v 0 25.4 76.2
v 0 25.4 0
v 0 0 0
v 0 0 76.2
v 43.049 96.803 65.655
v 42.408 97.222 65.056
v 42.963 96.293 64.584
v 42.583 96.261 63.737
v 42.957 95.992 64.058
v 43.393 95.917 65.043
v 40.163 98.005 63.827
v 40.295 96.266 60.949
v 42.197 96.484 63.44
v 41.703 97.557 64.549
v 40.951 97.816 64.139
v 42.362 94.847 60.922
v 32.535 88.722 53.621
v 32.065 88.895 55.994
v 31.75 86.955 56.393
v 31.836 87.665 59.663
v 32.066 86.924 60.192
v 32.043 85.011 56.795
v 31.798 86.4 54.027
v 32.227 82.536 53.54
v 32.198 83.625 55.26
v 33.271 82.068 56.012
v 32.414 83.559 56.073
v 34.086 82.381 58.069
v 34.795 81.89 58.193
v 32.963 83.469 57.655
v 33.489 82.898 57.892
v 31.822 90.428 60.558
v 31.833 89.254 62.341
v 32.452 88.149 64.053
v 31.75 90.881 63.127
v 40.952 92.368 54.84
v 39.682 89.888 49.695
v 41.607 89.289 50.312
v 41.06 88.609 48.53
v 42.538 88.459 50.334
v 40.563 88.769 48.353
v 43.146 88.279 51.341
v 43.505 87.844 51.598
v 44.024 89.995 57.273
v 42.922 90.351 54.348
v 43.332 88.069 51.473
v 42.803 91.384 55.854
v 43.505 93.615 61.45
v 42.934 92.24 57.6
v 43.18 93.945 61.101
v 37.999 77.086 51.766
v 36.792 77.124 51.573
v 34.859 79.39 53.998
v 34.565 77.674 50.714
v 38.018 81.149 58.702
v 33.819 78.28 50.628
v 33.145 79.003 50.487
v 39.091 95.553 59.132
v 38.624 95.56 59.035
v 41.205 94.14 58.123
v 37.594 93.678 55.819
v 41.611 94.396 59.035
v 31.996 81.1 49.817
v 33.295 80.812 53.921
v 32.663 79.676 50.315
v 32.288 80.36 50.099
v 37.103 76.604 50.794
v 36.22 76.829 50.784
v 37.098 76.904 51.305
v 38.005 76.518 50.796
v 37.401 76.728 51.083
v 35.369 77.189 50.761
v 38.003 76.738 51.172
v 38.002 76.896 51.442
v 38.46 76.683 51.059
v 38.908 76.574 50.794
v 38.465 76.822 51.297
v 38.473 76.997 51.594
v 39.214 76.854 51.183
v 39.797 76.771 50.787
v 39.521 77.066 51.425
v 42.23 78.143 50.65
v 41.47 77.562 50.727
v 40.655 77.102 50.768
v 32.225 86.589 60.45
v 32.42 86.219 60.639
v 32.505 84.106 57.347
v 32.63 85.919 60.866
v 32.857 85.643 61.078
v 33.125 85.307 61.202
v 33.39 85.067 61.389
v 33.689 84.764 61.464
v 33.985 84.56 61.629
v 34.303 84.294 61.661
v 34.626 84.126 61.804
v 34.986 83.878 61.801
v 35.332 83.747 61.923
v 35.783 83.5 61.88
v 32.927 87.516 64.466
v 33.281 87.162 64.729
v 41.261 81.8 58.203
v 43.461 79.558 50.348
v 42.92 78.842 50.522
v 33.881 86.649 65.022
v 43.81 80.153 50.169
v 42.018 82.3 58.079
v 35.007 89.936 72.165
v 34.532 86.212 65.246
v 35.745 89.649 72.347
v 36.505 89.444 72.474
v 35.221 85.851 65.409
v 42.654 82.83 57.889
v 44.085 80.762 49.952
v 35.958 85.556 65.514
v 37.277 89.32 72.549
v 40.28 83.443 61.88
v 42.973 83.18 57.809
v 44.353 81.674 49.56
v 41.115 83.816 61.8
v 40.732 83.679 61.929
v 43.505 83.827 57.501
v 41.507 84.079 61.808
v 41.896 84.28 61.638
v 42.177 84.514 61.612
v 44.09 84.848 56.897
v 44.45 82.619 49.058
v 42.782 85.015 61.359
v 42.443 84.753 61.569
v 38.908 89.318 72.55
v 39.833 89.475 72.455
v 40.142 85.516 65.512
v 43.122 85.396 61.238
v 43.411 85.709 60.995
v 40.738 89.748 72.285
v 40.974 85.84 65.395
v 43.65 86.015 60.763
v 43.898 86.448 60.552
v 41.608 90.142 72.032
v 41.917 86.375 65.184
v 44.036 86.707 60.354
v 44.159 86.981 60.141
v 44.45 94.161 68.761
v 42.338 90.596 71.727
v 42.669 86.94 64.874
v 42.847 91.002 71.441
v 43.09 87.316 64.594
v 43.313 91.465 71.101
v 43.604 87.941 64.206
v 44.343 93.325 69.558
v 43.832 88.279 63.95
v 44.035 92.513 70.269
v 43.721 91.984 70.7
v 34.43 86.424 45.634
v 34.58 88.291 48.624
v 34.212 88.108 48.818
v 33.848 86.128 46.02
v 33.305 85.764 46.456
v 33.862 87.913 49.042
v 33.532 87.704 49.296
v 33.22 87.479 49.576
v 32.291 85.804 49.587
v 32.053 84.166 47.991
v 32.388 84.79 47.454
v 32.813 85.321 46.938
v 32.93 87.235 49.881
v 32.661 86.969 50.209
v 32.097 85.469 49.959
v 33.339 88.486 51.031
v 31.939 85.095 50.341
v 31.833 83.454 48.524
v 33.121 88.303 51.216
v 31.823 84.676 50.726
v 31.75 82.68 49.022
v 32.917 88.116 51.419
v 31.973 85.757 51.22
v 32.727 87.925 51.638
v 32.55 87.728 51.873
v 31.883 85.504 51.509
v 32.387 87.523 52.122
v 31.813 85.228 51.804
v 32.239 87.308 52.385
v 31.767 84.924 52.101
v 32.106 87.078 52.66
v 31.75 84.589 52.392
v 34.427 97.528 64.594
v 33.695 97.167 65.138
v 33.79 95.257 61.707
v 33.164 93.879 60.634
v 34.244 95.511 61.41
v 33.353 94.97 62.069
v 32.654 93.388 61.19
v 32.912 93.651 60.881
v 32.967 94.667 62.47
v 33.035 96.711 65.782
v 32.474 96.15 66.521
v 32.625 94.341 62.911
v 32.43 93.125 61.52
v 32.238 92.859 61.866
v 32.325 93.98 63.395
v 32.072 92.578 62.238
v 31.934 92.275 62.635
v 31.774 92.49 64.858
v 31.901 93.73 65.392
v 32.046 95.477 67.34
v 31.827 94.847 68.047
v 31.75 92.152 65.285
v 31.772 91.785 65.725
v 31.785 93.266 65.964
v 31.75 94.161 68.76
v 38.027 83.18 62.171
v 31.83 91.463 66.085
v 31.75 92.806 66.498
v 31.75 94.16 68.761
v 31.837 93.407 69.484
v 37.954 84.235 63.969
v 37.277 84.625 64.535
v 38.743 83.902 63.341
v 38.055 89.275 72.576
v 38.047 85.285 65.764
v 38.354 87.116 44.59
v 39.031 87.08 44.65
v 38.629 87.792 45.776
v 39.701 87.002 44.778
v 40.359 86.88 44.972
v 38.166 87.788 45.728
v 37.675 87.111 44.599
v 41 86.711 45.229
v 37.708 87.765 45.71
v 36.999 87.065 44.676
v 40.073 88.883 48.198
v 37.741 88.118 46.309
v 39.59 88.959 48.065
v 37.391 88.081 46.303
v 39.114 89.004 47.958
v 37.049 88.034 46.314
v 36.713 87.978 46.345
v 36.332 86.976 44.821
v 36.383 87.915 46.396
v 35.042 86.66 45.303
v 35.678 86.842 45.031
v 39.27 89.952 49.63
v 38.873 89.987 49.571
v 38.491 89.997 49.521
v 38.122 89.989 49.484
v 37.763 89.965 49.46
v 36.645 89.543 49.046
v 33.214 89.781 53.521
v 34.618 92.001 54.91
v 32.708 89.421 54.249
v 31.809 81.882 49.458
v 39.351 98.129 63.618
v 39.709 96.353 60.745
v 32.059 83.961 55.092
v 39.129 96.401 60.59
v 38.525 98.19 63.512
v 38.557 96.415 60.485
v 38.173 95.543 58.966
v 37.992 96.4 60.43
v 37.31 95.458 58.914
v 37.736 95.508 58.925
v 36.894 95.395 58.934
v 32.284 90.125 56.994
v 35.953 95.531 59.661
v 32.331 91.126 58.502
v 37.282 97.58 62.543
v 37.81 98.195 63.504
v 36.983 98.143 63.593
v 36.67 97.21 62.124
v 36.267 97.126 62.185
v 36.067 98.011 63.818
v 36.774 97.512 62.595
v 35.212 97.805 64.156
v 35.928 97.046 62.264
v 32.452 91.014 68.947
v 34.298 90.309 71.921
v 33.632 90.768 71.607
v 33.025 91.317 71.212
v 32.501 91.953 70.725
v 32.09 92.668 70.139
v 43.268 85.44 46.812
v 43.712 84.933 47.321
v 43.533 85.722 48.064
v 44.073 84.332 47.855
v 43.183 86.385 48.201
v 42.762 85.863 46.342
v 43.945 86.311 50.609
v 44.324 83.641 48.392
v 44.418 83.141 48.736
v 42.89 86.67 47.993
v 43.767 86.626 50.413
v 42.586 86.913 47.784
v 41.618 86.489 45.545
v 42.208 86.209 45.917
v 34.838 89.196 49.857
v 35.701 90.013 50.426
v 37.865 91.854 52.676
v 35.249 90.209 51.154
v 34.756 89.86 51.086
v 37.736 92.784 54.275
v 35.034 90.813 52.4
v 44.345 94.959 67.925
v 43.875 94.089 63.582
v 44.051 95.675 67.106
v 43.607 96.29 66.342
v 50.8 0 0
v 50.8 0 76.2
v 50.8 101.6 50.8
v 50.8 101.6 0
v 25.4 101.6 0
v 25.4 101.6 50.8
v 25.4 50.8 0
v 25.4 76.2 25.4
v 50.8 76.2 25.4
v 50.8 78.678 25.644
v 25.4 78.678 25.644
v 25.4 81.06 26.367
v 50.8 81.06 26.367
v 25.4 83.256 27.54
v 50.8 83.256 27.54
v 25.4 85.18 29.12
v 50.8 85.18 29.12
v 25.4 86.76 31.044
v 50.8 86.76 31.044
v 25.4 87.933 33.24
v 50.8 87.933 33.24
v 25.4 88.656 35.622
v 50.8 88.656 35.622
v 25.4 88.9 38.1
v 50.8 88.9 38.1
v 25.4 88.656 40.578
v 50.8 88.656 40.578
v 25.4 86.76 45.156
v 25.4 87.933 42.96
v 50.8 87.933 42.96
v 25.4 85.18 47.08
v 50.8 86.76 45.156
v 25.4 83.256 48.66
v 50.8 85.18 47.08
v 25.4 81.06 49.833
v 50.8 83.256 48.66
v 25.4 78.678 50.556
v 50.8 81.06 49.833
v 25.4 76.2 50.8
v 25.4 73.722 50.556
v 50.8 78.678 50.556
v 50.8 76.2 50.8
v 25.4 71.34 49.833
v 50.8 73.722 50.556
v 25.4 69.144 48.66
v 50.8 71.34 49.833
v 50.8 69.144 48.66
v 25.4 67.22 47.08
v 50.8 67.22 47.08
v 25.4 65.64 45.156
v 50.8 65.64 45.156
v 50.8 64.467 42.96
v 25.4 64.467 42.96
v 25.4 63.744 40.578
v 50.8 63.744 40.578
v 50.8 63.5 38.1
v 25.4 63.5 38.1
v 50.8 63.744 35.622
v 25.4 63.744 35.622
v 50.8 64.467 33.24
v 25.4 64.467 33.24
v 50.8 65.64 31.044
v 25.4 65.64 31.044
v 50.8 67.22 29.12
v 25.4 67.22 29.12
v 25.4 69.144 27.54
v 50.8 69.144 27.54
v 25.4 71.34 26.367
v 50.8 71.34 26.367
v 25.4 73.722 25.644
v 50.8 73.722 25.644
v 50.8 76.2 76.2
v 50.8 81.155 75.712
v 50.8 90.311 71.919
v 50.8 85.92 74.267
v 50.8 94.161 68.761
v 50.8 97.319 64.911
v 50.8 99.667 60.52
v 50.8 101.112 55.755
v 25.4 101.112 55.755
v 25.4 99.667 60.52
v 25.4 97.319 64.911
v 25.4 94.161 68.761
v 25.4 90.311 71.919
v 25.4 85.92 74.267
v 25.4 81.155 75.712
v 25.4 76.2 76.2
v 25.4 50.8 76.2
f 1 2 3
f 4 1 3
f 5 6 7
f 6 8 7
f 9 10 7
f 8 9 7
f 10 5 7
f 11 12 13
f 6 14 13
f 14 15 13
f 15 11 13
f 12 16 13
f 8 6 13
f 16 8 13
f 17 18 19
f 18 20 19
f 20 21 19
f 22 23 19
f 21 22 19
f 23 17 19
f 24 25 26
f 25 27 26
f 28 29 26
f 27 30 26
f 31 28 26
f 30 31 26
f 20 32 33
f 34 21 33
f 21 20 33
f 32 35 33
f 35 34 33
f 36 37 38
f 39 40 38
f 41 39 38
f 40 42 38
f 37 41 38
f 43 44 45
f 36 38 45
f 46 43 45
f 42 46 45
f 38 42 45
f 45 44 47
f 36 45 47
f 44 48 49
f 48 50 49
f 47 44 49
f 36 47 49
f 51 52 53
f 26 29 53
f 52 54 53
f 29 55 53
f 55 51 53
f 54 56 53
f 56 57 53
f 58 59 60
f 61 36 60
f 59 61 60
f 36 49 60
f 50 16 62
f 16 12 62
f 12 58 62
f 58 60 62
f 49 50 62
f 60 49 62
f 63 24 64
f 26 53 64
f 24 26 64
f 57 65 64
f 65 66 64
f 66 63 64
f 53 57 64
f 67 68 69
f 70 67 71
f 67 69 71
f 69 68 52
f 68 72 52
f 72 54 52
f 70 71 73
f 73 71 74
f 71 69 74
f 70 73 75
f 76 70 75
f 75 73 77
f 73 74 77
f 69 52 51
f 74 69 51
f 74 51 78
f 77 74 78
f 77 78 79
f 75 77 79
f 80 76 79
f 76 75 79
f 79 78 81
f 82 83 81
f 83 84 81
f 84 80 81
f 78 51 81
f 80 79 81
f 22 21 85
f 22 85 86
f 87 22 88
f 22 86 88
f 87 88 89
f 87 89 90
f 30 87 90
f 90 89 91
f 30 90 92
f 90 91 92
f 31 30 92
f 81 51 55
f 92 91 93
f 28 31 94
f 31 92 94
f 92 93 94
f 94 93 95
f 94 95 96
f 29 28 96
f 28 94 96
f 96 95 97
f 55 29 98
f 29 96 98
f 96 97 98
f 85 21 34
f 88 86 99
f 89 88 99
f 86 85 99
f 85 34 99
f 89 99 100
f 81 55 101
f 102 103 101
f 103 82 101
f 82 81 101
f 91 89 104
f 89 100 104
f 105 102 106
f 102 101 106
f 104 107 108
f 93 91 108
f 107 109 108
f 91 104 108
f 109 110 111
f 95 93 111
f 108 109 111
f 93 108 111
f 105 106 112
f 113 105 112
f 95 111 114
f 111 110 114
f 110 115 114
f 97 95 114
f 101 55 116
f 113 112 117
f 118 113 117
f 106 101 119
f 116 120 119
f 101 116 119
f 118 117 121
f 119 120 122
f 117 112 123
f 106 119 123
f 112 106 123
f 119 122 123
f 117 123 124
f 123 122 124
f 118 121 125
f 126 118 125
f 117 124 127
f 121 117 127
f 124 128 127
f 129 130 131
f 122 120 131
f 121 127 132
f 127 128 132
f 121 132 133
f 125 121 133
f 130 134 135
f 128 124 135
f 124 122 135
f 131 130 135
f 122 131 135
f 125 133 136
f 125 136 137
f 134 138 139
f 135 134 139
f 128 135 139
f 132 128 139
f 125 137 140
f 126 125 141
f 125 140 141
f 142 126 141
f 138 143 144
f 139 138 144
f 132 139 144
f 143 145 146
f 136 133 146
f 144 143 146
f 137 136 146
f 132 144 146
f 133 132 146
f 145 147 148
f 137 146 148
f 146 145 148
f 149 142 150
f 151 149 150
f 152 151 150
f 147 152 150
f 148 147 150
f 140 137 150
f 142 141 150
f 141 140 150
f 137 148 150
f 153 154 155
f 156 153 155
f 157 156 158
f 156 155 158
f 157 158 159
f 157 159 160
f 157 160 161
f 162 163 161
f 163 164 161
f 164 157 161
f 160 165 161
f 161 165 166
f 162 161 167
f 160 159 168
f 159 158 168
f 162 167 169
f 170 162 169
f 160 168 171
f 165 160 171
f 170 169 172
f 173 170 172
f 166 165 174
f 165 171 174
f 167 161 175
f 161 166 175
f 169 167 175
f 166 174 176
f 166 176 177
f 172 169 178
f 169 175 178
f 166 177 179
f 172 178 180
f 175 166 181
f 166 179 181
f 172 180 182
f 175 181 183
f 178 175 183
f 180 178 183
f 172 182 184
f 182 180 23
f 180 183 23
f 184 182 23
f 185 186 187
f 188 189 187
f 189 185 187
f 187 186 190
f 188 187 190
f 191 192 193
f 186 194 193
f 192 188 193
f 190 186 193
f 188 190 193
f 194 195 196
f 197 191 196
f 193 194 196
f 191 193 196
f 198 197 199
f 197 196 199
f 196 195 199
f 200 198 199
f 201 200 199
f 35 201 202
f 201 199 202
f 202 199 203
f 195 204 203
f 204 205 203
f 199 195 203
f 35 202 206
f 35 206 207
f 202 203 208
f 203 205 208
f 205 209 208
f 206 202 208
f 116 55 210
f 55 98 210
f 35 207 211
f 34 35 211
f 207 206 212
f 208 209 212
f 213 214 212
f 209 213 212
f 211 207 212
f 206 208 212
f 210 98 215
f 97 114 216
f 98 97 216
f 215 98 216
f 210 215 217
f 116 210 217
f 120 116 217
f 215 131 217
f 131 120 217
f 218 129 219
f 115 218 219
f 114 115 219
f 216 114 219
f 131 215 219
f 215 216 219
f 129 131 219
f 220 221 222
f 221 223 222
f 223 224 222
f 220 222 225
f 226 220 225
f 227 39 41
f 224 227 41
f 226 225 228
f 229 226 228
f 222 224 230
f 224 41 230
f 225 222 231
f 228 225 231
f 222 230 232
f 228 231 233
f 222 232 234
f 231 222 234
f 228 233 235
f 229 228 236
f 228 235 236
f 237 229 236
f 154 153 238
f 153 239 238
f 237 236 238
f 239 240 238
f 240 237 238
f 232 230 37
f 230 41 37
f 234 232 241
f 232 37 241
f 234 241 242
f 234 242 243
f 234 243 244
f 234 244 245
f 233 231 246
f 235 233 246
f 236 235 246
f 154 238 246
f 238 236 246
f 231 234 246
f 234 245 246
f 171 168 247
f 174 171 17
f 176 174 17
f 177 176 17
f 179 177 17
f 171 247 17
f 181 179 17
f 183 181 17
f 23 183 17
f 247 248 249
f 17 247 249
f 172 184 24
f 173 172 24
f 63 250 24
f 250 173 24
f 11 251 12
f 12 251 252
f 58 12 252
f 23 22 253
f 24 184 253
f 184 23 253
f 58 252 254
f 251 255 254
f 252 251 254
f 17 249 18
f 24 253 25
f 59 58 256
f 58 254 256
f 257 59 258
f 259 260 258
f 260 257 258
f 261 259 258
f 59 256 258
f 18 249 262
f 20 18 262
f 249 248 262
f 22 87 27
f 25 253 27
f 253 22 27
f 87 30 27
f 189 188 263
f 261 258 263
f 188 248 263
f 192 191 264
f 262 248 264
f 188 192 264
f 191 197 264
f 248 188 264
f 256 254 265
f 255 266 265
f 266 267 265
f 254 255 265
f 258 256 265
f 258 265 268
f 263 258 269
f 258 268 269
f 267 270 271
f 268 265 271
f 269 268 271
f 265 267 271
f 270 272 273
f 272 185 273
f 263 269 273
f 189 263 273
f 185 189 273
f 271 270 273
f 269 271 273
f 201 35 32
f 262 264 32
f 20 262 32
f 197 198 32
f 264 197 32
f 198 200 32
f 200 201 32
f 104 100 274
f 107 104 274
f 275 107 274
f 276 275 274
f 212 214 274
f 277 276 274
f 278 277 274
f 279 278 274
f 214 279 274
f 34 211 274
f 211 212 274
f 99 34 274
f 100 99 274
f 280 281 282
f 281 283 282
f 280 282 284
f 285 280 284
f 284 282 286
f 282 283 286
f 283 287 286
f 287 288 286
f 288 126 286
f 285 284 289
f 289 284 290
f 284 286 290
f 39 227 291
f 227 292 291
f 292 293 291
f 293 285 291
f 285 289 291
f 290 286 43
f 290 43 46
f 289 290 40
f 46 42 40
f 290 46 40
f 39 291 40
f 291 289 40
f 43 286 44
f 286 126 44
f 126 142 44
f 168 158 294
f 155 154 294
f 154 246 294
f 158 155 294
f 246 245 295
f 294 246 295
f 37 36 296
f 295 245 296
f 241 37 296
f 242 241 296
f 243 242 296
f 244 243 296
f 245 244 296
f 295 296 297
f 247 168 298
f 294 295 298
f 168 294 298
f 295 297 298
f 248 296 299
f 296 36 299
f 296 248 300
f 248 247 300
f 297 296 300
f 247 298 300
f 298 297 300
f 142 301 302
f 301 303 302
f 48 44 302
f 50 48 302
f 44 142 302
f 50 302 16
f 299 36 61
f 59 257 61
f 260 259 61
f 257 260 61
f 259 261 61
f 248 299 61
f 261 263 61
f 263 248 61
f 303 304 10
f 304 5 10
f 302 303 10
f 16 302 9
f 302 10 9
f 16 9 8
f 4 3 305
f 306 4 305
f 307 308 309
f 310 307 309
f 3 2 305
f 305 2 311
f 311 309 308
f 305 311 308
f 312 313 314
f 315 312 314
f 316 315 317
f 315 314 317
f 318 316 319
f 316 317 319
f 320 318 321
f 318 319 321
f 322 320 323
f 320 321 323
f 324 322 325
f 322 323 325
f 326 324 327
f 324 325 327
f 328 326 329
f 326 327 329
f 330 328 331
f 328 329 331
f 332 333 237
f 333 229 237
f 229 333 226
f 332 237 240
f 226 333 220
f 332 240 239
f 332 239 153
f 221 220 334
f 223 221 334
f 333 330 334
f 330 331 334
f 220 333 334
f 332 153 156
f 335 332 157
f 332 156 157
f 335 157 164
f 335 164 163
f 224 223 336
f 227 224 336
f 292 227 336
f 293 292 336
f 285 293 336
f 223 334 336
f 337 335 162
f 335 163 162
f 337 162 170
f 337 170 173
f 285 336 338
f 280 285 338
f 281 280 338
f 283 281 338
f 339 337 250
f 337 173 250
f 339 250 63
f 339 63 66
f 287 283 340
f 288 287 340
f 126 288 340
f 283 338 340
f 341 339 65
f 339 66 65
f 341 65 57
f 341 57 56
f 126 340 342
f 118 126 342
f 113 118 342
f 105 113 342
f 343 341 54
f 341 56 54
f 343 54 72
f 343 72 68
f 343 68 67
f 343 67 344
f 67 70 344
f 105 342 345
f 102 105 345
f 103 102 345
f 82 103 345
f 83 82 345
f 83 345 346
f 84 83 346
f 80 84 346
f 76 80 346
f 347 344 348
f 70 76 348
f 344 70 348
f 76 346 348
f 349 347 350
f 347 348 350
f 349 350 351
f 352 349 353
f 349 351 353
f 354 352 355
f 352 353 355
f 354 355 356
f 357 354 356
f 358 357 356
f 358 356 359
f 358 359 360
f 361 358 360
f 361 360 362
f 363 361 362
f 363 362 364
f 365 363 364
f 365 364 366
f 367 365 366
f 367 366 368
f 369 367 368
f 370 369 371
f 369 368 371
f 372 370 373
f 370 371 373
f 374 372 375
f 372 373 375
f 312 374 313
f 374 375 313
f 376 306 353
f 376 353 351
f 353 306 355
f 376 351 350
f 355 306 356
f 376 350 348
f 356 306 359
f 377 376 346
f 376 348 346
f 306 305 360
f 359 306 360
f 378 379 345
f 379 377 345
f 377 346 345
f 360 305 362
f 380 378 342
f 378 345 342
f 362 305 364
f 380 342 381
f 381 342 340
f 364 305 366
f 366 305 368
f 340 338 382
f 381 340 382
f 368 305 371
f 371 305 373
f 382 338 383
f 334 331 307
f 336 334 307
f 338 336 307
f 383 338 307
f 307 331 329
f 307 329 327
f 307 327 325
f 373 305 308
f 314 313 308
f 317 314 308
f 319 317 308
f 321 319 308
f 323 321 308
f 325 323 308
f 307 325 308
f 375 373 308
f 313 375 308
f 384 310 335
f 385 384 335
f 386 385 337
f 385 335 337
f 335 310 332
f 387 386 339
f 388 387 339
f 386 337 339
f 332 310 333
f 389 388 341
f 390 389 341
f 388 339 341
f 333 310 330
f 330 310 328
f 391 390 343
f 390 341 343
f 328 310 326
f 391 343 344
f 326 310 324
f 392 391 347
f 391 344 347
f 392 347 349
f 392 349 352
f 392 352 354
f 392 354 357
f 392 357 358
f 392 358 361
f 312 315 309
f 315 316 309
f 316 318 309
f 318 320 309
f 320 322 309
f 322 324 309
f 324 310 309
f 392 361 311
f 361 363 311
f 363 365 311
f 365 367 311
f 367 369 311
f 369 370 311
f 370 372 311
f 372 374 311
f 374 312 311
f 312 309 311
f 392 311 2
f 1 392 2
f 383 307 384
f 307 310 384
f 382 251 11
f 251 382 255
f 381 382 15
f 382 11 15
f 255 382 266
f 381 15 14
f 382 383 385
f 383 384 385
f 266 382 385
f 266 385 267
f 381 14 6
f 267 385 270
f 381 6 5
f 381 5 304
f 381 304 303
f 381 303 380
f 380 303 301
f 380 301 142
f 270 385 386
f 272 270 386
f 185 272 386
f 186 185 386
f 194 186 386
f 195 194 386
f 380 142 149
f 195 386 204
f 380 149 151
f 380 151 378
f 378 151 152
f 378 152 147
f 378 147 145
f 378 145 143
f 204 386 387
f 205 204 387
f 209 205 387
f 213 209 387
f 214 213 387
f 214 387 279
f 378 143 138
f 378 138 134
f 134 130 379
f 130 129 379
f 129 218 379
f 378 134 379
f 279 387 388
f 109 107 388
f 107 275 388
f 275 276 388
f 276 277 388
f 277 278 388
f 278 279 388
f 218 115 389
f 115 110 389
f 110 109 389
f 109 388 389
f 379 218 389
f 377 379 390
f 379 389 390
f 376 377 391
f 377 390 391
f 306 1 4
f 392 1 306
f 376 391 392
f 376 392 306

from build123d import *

# Parameters (mm, degrees)
BOSS_EXTRUDE1_DEPTH = 76.2
FILLET1_R           = 25.4
SKETCH2_R           = 12.7
CUT_EXTRUDE1_DEPTH  = 252.476
SKETCH7_R           = 6.35


with BuildPart() as part:
    # Sketch1 → Boss-Extrude1 (new body)
    with BuildSketch(Plane.XY):
        Polygon((0, 0), (50.8, 0), (50.8, 101.6), (25.4, 101.6), (25.4, 50.8), (0, 25.4), align=None)
    extrude(amount=BOSS_EXTRUDE1_DEPTH)

    # Fillet1
    fillet1_edges = [part.edges().sort_by_distance(p)[0] for p in [
        (38.1, 101.6, 76.2),
    ]]
    fillet(fillet1_edges, radius=FILLET1_R)

    # Sketch2 → Cut-Extrude1 (cut, symmetric)
    with BuildSketch(Plane(origin=(0, 0, 0), x_dir=(0, 0, -1), z_dir=(1, 0, 0))):
        with Locations((-38.1, 76.2)):
            Circle(SKETCH2_R)
    extrude(amount=CUT_EXTRUDE1_DEPTH, both=True, mode=Mode.SUBTRACT)

    # Cut-Sweep1: sweep along a path in Sketch4
    with BuildLine(Plane(origin=(38.1, 0, -38.1), x_dir=(0, 0, 1), z_dir=(-1, 0, 0))) as cut_sweep1_path:
        Line((76.2, 76.2), (106.860512242, 94.160512242))
    # Sketch7 → Cut-Sweep1 (sweep, cut)
    with BuildSketch(Plane(origin=(38.1, 94.160512242, 68.760512242), x_dir=(1, 0, 0), z_dir=(0, 0.7071067811865479, 0.7071067811865472))):
        Circle(SKETCH7_R)
    sweep(path=cut_sweep1_path.line, mode=Mode.SUBTRACT)


solid = part.part
